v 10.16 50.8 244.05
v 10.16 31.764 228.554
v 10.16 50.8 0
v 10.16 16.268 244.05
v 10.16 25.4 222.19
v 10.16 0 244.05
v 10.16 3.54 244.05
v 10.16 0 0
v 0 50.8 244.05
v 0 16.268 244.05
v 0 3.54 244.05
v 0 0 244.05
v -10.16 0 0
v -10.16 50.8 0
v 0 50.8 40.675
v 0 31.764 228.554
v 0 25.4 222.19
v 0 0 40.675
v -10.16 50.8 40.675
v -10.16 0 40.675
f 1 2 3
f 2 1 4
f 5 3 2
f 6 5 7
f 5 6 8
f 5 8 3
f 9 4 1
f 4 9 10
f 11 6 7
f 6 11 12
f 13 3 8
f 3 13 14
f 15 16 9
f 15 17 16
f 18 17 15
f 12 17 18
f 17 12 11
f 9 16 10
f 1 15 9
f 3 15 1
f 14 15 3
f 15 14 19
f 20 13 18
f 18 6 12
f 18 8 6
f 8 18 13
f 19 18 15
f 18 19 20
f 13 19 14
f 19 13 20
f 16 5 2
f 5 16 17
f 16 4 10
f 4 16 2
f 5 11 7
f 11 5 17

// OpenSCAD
min_z=150;
roll_diameter=150;
roll_screw_guide_z=25.4*.75;
screw_guide=9;

roll_mount_thickness=25.4*.4;
roll_mount_width=25.4*2;
roll_mount_z= roll_diameter/2 + min_z + roll_screw_guide_z;


difference(){
union(){
cube([roll_mount_thickness,roll_mount_width,roll_mount_z]);
translate([-roll_mount_thickness,0,0])
cube([roll_mount_thickness*2,roll_mount_width,roll_mount_z/6]);
}
 
color("red")
translate([-1, roll_mount_width/2, roll_mount_z - roll_screw_guide_z*1.2 + 1])
rotate([45,0,0])
cube([roll_mount_thickness+2, screw_guide, roll_screw_guide_z+15]);
}
echo(roll_mount_z);
